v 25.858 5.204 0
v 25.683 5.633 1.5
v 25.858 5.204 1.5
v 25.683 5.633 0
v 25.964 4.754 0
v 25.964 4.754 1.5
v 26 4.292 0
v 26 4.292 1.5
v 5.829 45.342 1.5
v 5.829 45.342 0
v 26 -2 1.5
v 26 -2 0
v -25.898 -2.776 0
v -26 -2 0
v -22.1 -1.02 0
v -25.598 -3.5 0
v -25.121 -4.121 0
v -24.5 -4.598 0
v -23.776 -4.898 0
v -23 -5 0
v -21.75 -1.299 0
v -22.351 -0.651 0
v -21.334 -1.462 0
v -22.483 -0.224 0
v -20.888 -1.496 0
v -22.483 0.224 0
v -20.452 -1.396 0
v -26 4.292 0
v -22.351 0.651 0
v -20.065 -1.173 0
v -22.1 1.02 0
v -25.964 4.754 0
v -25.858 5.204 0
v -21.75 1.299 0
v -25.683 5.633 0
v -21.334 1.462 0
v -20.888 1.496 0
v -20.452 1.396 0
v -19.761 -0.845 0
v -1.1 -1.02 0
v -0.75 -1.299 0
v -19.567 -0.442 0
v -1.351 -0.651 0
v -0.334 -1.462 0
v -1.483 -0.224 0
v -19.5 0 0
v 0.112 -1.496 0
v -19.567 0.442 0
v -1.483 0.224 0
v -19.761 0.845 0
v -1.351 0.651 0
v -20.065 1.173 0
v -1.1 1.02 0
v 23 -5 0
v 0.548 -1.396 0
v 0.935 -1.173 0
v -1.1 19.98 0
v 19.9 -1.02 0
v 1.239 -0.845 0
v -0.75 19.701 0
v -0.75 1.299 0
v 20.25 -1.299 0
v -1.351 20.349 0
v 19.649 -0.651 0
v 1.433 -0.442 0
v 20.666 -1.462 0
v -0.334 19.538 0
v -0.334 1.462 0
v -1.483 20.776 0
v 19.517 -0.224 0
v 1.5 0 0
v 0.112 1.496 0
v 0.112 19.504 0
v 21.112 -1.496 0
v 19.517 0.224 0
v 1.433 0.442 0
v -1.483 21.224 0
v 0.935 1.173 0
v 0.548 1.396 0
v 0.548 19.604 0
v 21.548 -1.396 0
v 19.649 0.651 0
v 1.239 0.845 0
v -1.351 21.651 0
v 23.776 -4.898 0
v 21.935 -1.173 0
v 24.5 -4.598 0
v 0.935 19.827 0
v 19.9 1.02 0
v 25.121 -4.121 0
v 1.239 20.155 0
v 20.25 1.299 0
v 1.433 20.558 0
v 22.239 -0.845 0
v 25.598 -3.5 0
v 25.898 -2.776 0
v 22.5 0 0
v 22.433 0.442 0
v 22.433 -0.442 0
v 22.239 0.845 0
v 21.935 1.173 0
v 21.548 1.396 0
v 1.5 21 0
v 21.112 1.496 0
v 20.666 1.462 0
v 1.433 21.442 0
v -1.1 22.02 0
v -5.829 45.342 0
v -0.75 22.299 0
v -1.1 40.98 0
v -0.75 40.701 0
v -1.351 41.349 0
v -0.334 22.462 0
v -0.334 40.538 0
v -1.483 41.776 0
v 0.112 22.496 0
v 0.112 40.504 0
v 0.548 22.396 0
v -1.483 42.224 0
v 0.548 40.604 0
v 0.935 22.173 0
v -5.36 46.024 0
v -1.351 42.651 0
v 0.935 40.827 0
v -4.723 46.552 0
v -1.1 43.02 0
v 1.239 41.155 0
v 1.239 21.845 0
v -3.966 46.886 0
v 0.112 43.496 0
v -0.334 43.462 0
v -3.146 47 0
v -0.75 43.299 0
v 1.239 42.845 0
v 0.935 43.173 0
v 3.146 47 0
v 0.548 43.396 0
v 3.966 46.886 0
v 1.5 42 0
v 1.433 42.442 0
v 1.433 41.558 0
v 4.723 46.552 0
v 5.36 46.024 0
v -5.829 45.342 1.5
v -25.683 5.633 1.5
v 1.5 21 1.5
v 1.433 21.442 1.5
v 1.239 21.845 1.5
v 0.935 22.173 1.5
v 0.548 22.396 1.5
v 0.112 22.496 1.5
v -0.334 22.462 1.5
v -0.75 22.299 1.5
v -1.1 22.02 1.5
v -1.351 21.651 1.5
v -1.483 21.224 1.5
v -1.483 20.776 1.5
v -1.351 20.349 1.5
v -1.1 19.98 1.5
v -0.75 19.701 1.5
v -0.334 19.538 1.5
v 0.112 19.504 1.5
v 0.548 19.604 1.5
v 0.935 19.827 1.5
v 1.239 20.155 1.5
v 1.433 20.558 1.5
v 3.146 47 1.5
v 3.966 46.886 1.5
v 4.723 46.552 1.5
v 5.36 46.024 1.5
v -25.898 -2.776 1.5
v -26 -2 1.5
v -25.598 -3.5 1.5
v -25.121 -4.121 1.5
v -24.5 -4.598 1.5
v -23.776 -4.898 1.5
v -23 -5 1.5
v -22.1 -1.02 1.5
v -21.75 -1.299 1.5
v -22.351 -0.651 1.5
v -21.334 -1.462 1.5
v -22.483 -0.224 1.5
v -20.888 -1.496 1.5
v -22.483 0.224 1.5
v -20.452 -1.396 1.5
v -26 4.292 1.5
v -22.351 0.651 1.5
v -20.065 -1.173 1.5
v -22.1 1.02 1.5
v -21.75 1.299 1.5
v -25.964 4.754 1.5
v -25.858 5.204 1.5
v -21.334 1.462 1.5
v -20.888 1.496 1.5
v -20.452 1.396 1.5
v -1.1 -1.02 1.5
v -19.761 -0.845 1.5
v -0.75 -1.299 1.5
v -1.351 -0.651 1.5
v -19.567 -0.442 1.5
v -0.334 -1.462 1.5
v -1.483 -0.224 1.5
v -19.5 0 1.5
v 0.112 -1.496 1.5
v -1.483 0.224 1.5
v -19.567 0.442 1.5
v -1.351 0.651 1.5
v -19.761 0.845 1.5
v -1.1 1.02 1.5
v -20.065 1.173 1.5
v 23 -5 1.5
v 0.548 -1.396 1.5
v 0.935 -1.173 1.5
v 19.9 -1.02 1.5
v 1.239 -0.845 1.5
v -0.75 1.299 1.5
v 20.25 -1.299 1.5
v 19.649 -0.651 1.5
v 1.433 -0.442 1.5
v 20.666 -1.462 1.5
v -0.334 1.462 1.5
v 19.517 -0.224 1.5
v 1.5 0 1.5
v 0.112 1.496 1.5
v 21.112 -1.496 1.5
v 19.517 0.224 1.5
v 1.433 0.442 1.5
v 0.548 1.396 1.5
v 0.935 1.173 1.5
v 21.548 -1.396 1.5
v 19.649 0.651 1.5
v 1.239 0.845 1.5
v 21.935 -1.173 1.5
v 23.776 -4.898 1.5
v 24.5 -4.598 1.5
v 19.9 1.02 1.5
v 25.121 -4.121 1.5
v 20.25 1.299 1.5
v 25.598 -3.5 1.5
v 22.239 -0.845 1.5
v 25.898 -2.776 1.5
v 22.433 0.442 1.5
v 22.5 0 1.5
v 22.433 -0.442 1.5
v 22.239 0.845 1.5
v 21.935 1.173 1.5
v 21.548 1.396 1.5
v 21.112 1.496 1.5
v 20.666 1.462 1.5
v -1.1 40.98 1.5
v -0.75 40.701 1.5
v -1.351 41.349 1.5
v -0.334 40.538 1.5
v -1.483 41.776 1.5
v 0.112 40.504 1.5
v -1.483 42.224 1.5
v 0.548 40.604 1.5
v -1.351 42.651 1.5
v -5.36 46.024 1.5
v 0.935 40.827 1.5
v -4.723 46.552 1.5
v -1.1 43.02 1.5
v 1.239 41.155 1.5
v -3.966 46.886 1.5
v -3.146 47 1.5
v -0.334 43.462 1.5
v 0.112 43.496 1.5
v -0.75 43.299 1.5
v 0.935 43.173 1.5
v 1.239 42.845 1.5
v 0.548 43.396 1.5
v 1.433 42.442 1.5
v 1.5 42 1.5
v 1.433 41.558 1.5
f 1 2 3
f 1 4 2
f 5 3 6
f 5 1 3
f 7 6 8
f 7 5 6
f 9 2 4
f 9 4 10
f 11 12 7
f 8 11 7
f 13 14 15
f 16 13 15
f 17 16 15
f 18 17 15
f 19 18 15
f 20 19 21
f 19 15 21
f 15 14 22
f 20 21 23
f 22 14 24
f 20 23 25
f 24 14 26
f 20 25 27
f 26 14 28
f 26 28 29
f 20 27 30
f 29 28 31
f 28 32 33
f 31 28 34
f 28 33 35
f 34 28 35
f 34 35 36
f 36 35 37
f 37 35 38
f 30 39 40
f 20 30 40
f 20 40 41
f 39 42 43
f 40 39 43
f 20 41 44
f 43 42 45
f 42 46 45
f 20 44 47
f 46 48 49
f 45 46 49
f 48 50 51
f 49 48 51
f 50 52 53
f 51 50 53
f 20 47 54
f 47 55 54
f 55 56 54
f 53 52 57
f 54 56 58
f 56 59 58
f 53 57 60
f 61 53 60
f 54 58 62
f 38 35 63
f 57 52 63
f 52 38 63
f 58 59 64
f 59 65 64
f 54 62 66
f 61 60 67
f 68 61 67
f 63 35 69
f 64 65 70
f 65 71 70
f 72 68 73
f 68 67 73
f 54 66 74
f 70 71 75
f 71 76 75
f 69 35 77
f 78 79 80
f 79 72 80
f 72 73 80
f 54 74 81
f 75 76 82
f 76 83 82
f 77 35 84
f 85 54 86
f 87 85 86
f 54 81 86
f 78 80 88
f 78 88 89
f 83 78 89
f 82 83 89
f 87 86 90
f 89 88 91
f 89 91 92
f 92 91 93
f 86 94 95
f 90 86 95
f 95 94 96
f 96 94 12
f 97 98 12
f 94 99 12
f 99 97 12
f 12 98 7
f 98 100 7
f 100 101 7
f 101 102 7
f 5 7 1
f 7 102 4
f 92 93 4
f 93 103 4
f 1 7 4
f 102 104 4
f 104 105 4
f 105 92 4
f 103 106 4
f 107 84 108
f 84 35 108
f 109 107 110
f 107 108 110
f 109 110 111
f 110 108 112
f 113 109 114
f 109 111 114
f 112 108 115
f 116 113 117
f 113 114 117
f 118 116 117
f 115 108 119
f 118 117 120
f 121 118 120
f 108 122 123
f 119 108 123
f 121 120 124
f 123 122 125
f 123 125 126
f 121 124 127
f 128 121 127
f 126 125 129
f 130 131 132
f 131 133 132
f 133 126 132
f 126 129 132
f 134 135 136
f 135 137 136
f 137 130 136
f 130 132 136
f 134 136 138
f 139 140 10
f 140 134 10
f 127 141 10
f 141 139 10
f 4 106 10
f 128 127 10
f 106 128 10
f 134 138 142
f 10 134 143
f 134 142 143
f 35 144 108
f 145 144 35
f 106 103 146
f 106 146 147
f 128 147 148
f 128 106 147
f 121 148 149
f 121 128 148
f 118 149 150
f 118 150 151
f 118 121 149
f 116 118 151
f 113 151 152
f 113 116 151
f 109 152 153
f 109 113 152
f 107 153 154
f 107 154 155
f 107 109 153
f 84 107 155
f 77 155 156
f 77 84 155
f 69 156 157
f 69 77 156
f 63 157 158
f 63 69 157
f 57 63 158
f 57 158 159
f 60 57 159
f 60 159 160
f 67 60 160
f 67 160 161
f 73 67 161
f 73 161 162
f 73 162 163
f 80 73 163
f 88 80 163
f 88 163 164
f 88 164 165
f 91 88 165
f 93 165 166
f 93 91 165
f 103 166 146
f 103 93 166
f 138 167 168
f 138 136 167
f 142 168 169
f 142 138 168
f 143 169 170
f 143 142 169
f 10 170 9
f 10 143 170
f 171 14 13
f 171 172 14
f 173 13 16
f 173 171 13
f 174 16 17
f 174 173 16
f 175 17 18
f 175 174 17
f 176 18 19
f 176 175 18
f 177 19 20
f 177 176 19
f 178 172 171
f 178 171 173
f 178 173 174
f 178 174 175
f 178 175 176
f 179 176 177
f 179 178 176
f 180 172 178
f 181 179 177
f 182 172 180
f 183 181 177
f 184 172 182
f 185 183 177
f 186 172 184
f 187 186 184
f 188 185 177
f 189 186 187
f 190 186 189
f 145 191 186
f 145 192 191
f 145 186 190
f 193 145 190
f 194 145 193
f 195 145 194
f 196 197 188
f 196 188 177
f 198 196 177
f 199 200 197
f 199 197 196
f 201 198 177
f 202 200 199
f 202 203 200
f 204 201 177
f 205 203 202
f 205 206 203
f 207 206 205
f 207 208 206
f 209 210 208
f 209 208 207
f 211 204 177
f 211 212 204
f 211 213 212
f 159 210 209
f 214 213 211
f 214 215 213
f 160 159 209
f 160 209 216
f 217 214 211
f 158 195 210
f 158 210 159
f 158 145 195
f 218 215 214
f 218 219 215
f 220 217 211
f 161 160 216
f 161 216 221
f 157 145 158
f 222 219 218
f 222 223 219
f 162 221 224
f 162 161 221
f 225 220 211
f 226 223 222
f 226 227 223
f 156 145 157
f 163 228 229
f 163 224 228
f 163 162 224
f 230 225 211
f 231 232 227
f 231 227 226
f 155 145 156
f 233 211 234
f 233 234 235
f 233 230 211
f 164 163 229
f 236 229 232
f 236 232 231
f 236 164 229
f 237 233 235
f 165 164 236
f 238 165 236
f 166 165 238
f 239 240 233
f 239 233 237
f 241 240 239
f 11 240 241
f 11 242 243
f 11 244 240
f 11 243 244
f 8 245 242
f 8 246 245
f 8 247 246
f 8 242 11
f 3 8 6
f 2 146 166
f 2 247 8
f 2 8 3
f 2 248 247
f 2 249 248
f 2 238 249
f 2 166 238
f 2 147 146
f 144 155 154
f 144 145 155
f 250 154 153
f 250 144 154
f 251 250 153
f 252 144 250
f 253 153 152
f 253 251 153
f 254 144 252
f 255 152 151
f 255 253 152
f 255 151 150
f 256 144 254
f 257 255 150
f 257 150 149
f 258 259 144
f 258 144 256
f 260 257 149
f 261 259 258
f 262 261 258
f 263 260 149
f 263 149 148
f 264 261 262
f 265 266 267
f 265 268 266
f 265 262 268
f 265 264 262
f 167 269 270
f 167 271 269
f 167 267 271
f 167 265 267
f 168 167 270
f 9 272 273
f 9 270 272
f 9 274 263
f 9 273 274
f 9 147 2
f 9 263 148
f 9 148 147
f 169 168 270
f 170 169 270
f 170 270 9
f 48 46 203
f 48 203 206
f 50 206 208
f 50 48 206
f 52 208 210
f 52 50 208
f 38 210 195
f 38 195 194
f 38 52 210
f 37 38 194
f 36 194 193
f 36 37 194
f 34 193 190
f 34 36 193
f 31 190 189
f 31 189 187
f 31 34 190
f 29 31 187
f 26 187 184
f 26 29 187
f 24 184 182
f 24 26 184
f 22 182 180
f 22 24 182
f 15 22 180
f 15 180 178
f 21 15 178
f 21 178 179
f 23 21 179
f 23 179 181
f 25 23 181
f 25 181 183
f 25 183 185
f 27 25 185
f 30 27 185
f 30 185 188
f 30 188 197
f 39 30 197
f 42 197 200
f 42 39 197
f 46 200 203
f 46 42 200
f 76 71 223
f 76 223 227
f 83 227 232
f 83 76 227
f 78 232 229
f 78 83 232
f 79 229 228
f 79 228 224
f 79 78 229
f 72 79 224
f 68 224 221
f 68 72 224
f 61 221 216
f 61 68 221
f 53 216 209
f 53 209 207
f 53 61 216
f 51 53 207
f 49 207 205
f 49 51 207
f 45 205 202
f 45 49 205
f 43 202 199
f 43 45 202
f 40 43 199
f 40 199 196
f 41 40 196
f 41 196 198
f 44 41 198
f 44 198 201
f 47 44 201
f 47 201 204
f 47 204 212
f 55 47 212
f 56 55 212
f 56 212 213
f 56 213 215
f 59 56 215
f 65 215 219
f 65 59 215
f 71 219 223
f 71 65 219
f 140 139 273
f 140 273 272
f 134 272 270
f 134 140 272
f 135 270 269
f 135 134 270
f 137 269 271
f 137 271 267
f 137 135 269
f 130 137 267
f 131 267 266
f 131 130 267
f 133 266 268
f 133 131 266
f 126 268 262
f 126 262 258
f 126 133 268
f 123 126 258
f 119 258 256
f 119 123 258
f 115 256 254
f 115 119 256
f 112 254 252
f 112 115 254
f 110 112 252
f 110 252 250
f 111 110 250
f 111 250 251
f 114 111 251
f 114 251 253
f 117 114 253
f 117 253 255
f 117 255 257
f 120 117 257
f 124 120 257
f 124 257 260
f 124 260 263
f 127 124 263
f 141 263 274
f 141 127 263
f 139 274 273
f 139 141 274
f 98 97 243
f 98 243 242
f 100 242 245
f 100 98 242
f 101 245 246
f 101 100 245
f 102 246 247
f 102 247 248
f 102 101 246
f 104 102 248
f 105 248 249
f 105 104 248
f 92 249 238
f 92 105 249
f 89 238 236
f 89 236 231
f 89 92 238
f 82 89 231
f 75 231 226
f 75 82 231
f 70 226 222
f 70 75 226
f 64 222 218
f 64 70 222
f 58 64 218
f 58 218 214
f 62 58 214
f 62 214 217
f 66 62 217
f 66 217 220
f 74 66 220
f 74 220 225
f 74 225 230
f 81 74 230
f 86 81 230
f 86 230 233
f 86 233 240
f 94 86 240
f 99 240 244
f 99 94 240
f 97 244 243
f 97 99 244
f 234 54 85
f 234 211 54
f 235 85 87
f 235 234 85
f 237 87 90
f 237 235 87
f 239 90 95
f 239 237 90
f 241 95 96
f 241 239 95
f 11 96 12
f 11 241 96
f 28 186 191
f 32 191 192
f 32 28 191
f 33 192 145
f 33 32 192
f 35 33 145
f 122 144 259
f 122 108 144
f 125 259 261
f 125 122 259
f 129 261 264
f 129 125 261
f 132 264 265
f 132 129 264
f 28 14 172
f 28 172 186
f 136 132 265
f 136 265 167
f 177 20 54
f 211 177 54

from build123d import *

# Parameters (mm, degrees)
ESQUISSE1_W             = 52
ESQUISSE1_H             = 52
ESQUISSE1_R             = 1.5
BOSS_EXTRU_1_DEPTH      = 1.5
ENL_V_MAT_EXTRU_1_DEPTH = 54.73313689
CONG_1_R                = 3


with BuildPart() as part:
    # Esquisse1 → Boss.-Extru.1 (new body)
    with BuildSketch(Plane.XY):
        with Locations((0, 21)):
            Rectangle(ESQUISSE1_W, ESQUISSE1_H)
        with Locations((-21, 0)):
            Circle(ESQUISSE1_R, mode=Mode.SUBTRACT)
        Circle(ESQUISSE1_R, mode=Mode.SUBTRACT)
        with Locations((21, 0)):
            Circle(ESQUISSE1_R, mode=Mode.SUBTRACT)
        with Locations((0, 42)):
            Circle(ESQUISSE1_R, mode=Mode.SUBTRACT)
        with Locations((0, 21)):
            Circle(ESQUISSE1_R, mode=Mode.SUBTRACT)
    extrude(amount=BOSS_EXTRU_1_DEPTH)

    # Esquisse2 → Enlèv. mat.-Extru.1 (cut, through all)
    with BuildSketch(Plane.XY.offset(1.5)):
        Polygon((-26, 47), (-5, 47), (-26, 5), align=None)
        Polygon((26, 47), (26, 5), (5, 47), align=None)
    extrude(amount=-ENL_V_MAT_EXTRU_1_DEPTH, mode=Mode.SUBTRACT)

    # Congé1
    cong_1_edges = [part.edges().sort_by_distance(p)[0] for p in [
        (-26, 5, 0.75),
        (-5, 47, 0.75),
        (5, 47, 0.75),
        (26, 5, 0.75),
        (26, -5, 0.75),
        (-26, -5, 0.75),
    ]]
    fillet(cong_1_edges, radius=CONG_1_R)


solid = part.part
